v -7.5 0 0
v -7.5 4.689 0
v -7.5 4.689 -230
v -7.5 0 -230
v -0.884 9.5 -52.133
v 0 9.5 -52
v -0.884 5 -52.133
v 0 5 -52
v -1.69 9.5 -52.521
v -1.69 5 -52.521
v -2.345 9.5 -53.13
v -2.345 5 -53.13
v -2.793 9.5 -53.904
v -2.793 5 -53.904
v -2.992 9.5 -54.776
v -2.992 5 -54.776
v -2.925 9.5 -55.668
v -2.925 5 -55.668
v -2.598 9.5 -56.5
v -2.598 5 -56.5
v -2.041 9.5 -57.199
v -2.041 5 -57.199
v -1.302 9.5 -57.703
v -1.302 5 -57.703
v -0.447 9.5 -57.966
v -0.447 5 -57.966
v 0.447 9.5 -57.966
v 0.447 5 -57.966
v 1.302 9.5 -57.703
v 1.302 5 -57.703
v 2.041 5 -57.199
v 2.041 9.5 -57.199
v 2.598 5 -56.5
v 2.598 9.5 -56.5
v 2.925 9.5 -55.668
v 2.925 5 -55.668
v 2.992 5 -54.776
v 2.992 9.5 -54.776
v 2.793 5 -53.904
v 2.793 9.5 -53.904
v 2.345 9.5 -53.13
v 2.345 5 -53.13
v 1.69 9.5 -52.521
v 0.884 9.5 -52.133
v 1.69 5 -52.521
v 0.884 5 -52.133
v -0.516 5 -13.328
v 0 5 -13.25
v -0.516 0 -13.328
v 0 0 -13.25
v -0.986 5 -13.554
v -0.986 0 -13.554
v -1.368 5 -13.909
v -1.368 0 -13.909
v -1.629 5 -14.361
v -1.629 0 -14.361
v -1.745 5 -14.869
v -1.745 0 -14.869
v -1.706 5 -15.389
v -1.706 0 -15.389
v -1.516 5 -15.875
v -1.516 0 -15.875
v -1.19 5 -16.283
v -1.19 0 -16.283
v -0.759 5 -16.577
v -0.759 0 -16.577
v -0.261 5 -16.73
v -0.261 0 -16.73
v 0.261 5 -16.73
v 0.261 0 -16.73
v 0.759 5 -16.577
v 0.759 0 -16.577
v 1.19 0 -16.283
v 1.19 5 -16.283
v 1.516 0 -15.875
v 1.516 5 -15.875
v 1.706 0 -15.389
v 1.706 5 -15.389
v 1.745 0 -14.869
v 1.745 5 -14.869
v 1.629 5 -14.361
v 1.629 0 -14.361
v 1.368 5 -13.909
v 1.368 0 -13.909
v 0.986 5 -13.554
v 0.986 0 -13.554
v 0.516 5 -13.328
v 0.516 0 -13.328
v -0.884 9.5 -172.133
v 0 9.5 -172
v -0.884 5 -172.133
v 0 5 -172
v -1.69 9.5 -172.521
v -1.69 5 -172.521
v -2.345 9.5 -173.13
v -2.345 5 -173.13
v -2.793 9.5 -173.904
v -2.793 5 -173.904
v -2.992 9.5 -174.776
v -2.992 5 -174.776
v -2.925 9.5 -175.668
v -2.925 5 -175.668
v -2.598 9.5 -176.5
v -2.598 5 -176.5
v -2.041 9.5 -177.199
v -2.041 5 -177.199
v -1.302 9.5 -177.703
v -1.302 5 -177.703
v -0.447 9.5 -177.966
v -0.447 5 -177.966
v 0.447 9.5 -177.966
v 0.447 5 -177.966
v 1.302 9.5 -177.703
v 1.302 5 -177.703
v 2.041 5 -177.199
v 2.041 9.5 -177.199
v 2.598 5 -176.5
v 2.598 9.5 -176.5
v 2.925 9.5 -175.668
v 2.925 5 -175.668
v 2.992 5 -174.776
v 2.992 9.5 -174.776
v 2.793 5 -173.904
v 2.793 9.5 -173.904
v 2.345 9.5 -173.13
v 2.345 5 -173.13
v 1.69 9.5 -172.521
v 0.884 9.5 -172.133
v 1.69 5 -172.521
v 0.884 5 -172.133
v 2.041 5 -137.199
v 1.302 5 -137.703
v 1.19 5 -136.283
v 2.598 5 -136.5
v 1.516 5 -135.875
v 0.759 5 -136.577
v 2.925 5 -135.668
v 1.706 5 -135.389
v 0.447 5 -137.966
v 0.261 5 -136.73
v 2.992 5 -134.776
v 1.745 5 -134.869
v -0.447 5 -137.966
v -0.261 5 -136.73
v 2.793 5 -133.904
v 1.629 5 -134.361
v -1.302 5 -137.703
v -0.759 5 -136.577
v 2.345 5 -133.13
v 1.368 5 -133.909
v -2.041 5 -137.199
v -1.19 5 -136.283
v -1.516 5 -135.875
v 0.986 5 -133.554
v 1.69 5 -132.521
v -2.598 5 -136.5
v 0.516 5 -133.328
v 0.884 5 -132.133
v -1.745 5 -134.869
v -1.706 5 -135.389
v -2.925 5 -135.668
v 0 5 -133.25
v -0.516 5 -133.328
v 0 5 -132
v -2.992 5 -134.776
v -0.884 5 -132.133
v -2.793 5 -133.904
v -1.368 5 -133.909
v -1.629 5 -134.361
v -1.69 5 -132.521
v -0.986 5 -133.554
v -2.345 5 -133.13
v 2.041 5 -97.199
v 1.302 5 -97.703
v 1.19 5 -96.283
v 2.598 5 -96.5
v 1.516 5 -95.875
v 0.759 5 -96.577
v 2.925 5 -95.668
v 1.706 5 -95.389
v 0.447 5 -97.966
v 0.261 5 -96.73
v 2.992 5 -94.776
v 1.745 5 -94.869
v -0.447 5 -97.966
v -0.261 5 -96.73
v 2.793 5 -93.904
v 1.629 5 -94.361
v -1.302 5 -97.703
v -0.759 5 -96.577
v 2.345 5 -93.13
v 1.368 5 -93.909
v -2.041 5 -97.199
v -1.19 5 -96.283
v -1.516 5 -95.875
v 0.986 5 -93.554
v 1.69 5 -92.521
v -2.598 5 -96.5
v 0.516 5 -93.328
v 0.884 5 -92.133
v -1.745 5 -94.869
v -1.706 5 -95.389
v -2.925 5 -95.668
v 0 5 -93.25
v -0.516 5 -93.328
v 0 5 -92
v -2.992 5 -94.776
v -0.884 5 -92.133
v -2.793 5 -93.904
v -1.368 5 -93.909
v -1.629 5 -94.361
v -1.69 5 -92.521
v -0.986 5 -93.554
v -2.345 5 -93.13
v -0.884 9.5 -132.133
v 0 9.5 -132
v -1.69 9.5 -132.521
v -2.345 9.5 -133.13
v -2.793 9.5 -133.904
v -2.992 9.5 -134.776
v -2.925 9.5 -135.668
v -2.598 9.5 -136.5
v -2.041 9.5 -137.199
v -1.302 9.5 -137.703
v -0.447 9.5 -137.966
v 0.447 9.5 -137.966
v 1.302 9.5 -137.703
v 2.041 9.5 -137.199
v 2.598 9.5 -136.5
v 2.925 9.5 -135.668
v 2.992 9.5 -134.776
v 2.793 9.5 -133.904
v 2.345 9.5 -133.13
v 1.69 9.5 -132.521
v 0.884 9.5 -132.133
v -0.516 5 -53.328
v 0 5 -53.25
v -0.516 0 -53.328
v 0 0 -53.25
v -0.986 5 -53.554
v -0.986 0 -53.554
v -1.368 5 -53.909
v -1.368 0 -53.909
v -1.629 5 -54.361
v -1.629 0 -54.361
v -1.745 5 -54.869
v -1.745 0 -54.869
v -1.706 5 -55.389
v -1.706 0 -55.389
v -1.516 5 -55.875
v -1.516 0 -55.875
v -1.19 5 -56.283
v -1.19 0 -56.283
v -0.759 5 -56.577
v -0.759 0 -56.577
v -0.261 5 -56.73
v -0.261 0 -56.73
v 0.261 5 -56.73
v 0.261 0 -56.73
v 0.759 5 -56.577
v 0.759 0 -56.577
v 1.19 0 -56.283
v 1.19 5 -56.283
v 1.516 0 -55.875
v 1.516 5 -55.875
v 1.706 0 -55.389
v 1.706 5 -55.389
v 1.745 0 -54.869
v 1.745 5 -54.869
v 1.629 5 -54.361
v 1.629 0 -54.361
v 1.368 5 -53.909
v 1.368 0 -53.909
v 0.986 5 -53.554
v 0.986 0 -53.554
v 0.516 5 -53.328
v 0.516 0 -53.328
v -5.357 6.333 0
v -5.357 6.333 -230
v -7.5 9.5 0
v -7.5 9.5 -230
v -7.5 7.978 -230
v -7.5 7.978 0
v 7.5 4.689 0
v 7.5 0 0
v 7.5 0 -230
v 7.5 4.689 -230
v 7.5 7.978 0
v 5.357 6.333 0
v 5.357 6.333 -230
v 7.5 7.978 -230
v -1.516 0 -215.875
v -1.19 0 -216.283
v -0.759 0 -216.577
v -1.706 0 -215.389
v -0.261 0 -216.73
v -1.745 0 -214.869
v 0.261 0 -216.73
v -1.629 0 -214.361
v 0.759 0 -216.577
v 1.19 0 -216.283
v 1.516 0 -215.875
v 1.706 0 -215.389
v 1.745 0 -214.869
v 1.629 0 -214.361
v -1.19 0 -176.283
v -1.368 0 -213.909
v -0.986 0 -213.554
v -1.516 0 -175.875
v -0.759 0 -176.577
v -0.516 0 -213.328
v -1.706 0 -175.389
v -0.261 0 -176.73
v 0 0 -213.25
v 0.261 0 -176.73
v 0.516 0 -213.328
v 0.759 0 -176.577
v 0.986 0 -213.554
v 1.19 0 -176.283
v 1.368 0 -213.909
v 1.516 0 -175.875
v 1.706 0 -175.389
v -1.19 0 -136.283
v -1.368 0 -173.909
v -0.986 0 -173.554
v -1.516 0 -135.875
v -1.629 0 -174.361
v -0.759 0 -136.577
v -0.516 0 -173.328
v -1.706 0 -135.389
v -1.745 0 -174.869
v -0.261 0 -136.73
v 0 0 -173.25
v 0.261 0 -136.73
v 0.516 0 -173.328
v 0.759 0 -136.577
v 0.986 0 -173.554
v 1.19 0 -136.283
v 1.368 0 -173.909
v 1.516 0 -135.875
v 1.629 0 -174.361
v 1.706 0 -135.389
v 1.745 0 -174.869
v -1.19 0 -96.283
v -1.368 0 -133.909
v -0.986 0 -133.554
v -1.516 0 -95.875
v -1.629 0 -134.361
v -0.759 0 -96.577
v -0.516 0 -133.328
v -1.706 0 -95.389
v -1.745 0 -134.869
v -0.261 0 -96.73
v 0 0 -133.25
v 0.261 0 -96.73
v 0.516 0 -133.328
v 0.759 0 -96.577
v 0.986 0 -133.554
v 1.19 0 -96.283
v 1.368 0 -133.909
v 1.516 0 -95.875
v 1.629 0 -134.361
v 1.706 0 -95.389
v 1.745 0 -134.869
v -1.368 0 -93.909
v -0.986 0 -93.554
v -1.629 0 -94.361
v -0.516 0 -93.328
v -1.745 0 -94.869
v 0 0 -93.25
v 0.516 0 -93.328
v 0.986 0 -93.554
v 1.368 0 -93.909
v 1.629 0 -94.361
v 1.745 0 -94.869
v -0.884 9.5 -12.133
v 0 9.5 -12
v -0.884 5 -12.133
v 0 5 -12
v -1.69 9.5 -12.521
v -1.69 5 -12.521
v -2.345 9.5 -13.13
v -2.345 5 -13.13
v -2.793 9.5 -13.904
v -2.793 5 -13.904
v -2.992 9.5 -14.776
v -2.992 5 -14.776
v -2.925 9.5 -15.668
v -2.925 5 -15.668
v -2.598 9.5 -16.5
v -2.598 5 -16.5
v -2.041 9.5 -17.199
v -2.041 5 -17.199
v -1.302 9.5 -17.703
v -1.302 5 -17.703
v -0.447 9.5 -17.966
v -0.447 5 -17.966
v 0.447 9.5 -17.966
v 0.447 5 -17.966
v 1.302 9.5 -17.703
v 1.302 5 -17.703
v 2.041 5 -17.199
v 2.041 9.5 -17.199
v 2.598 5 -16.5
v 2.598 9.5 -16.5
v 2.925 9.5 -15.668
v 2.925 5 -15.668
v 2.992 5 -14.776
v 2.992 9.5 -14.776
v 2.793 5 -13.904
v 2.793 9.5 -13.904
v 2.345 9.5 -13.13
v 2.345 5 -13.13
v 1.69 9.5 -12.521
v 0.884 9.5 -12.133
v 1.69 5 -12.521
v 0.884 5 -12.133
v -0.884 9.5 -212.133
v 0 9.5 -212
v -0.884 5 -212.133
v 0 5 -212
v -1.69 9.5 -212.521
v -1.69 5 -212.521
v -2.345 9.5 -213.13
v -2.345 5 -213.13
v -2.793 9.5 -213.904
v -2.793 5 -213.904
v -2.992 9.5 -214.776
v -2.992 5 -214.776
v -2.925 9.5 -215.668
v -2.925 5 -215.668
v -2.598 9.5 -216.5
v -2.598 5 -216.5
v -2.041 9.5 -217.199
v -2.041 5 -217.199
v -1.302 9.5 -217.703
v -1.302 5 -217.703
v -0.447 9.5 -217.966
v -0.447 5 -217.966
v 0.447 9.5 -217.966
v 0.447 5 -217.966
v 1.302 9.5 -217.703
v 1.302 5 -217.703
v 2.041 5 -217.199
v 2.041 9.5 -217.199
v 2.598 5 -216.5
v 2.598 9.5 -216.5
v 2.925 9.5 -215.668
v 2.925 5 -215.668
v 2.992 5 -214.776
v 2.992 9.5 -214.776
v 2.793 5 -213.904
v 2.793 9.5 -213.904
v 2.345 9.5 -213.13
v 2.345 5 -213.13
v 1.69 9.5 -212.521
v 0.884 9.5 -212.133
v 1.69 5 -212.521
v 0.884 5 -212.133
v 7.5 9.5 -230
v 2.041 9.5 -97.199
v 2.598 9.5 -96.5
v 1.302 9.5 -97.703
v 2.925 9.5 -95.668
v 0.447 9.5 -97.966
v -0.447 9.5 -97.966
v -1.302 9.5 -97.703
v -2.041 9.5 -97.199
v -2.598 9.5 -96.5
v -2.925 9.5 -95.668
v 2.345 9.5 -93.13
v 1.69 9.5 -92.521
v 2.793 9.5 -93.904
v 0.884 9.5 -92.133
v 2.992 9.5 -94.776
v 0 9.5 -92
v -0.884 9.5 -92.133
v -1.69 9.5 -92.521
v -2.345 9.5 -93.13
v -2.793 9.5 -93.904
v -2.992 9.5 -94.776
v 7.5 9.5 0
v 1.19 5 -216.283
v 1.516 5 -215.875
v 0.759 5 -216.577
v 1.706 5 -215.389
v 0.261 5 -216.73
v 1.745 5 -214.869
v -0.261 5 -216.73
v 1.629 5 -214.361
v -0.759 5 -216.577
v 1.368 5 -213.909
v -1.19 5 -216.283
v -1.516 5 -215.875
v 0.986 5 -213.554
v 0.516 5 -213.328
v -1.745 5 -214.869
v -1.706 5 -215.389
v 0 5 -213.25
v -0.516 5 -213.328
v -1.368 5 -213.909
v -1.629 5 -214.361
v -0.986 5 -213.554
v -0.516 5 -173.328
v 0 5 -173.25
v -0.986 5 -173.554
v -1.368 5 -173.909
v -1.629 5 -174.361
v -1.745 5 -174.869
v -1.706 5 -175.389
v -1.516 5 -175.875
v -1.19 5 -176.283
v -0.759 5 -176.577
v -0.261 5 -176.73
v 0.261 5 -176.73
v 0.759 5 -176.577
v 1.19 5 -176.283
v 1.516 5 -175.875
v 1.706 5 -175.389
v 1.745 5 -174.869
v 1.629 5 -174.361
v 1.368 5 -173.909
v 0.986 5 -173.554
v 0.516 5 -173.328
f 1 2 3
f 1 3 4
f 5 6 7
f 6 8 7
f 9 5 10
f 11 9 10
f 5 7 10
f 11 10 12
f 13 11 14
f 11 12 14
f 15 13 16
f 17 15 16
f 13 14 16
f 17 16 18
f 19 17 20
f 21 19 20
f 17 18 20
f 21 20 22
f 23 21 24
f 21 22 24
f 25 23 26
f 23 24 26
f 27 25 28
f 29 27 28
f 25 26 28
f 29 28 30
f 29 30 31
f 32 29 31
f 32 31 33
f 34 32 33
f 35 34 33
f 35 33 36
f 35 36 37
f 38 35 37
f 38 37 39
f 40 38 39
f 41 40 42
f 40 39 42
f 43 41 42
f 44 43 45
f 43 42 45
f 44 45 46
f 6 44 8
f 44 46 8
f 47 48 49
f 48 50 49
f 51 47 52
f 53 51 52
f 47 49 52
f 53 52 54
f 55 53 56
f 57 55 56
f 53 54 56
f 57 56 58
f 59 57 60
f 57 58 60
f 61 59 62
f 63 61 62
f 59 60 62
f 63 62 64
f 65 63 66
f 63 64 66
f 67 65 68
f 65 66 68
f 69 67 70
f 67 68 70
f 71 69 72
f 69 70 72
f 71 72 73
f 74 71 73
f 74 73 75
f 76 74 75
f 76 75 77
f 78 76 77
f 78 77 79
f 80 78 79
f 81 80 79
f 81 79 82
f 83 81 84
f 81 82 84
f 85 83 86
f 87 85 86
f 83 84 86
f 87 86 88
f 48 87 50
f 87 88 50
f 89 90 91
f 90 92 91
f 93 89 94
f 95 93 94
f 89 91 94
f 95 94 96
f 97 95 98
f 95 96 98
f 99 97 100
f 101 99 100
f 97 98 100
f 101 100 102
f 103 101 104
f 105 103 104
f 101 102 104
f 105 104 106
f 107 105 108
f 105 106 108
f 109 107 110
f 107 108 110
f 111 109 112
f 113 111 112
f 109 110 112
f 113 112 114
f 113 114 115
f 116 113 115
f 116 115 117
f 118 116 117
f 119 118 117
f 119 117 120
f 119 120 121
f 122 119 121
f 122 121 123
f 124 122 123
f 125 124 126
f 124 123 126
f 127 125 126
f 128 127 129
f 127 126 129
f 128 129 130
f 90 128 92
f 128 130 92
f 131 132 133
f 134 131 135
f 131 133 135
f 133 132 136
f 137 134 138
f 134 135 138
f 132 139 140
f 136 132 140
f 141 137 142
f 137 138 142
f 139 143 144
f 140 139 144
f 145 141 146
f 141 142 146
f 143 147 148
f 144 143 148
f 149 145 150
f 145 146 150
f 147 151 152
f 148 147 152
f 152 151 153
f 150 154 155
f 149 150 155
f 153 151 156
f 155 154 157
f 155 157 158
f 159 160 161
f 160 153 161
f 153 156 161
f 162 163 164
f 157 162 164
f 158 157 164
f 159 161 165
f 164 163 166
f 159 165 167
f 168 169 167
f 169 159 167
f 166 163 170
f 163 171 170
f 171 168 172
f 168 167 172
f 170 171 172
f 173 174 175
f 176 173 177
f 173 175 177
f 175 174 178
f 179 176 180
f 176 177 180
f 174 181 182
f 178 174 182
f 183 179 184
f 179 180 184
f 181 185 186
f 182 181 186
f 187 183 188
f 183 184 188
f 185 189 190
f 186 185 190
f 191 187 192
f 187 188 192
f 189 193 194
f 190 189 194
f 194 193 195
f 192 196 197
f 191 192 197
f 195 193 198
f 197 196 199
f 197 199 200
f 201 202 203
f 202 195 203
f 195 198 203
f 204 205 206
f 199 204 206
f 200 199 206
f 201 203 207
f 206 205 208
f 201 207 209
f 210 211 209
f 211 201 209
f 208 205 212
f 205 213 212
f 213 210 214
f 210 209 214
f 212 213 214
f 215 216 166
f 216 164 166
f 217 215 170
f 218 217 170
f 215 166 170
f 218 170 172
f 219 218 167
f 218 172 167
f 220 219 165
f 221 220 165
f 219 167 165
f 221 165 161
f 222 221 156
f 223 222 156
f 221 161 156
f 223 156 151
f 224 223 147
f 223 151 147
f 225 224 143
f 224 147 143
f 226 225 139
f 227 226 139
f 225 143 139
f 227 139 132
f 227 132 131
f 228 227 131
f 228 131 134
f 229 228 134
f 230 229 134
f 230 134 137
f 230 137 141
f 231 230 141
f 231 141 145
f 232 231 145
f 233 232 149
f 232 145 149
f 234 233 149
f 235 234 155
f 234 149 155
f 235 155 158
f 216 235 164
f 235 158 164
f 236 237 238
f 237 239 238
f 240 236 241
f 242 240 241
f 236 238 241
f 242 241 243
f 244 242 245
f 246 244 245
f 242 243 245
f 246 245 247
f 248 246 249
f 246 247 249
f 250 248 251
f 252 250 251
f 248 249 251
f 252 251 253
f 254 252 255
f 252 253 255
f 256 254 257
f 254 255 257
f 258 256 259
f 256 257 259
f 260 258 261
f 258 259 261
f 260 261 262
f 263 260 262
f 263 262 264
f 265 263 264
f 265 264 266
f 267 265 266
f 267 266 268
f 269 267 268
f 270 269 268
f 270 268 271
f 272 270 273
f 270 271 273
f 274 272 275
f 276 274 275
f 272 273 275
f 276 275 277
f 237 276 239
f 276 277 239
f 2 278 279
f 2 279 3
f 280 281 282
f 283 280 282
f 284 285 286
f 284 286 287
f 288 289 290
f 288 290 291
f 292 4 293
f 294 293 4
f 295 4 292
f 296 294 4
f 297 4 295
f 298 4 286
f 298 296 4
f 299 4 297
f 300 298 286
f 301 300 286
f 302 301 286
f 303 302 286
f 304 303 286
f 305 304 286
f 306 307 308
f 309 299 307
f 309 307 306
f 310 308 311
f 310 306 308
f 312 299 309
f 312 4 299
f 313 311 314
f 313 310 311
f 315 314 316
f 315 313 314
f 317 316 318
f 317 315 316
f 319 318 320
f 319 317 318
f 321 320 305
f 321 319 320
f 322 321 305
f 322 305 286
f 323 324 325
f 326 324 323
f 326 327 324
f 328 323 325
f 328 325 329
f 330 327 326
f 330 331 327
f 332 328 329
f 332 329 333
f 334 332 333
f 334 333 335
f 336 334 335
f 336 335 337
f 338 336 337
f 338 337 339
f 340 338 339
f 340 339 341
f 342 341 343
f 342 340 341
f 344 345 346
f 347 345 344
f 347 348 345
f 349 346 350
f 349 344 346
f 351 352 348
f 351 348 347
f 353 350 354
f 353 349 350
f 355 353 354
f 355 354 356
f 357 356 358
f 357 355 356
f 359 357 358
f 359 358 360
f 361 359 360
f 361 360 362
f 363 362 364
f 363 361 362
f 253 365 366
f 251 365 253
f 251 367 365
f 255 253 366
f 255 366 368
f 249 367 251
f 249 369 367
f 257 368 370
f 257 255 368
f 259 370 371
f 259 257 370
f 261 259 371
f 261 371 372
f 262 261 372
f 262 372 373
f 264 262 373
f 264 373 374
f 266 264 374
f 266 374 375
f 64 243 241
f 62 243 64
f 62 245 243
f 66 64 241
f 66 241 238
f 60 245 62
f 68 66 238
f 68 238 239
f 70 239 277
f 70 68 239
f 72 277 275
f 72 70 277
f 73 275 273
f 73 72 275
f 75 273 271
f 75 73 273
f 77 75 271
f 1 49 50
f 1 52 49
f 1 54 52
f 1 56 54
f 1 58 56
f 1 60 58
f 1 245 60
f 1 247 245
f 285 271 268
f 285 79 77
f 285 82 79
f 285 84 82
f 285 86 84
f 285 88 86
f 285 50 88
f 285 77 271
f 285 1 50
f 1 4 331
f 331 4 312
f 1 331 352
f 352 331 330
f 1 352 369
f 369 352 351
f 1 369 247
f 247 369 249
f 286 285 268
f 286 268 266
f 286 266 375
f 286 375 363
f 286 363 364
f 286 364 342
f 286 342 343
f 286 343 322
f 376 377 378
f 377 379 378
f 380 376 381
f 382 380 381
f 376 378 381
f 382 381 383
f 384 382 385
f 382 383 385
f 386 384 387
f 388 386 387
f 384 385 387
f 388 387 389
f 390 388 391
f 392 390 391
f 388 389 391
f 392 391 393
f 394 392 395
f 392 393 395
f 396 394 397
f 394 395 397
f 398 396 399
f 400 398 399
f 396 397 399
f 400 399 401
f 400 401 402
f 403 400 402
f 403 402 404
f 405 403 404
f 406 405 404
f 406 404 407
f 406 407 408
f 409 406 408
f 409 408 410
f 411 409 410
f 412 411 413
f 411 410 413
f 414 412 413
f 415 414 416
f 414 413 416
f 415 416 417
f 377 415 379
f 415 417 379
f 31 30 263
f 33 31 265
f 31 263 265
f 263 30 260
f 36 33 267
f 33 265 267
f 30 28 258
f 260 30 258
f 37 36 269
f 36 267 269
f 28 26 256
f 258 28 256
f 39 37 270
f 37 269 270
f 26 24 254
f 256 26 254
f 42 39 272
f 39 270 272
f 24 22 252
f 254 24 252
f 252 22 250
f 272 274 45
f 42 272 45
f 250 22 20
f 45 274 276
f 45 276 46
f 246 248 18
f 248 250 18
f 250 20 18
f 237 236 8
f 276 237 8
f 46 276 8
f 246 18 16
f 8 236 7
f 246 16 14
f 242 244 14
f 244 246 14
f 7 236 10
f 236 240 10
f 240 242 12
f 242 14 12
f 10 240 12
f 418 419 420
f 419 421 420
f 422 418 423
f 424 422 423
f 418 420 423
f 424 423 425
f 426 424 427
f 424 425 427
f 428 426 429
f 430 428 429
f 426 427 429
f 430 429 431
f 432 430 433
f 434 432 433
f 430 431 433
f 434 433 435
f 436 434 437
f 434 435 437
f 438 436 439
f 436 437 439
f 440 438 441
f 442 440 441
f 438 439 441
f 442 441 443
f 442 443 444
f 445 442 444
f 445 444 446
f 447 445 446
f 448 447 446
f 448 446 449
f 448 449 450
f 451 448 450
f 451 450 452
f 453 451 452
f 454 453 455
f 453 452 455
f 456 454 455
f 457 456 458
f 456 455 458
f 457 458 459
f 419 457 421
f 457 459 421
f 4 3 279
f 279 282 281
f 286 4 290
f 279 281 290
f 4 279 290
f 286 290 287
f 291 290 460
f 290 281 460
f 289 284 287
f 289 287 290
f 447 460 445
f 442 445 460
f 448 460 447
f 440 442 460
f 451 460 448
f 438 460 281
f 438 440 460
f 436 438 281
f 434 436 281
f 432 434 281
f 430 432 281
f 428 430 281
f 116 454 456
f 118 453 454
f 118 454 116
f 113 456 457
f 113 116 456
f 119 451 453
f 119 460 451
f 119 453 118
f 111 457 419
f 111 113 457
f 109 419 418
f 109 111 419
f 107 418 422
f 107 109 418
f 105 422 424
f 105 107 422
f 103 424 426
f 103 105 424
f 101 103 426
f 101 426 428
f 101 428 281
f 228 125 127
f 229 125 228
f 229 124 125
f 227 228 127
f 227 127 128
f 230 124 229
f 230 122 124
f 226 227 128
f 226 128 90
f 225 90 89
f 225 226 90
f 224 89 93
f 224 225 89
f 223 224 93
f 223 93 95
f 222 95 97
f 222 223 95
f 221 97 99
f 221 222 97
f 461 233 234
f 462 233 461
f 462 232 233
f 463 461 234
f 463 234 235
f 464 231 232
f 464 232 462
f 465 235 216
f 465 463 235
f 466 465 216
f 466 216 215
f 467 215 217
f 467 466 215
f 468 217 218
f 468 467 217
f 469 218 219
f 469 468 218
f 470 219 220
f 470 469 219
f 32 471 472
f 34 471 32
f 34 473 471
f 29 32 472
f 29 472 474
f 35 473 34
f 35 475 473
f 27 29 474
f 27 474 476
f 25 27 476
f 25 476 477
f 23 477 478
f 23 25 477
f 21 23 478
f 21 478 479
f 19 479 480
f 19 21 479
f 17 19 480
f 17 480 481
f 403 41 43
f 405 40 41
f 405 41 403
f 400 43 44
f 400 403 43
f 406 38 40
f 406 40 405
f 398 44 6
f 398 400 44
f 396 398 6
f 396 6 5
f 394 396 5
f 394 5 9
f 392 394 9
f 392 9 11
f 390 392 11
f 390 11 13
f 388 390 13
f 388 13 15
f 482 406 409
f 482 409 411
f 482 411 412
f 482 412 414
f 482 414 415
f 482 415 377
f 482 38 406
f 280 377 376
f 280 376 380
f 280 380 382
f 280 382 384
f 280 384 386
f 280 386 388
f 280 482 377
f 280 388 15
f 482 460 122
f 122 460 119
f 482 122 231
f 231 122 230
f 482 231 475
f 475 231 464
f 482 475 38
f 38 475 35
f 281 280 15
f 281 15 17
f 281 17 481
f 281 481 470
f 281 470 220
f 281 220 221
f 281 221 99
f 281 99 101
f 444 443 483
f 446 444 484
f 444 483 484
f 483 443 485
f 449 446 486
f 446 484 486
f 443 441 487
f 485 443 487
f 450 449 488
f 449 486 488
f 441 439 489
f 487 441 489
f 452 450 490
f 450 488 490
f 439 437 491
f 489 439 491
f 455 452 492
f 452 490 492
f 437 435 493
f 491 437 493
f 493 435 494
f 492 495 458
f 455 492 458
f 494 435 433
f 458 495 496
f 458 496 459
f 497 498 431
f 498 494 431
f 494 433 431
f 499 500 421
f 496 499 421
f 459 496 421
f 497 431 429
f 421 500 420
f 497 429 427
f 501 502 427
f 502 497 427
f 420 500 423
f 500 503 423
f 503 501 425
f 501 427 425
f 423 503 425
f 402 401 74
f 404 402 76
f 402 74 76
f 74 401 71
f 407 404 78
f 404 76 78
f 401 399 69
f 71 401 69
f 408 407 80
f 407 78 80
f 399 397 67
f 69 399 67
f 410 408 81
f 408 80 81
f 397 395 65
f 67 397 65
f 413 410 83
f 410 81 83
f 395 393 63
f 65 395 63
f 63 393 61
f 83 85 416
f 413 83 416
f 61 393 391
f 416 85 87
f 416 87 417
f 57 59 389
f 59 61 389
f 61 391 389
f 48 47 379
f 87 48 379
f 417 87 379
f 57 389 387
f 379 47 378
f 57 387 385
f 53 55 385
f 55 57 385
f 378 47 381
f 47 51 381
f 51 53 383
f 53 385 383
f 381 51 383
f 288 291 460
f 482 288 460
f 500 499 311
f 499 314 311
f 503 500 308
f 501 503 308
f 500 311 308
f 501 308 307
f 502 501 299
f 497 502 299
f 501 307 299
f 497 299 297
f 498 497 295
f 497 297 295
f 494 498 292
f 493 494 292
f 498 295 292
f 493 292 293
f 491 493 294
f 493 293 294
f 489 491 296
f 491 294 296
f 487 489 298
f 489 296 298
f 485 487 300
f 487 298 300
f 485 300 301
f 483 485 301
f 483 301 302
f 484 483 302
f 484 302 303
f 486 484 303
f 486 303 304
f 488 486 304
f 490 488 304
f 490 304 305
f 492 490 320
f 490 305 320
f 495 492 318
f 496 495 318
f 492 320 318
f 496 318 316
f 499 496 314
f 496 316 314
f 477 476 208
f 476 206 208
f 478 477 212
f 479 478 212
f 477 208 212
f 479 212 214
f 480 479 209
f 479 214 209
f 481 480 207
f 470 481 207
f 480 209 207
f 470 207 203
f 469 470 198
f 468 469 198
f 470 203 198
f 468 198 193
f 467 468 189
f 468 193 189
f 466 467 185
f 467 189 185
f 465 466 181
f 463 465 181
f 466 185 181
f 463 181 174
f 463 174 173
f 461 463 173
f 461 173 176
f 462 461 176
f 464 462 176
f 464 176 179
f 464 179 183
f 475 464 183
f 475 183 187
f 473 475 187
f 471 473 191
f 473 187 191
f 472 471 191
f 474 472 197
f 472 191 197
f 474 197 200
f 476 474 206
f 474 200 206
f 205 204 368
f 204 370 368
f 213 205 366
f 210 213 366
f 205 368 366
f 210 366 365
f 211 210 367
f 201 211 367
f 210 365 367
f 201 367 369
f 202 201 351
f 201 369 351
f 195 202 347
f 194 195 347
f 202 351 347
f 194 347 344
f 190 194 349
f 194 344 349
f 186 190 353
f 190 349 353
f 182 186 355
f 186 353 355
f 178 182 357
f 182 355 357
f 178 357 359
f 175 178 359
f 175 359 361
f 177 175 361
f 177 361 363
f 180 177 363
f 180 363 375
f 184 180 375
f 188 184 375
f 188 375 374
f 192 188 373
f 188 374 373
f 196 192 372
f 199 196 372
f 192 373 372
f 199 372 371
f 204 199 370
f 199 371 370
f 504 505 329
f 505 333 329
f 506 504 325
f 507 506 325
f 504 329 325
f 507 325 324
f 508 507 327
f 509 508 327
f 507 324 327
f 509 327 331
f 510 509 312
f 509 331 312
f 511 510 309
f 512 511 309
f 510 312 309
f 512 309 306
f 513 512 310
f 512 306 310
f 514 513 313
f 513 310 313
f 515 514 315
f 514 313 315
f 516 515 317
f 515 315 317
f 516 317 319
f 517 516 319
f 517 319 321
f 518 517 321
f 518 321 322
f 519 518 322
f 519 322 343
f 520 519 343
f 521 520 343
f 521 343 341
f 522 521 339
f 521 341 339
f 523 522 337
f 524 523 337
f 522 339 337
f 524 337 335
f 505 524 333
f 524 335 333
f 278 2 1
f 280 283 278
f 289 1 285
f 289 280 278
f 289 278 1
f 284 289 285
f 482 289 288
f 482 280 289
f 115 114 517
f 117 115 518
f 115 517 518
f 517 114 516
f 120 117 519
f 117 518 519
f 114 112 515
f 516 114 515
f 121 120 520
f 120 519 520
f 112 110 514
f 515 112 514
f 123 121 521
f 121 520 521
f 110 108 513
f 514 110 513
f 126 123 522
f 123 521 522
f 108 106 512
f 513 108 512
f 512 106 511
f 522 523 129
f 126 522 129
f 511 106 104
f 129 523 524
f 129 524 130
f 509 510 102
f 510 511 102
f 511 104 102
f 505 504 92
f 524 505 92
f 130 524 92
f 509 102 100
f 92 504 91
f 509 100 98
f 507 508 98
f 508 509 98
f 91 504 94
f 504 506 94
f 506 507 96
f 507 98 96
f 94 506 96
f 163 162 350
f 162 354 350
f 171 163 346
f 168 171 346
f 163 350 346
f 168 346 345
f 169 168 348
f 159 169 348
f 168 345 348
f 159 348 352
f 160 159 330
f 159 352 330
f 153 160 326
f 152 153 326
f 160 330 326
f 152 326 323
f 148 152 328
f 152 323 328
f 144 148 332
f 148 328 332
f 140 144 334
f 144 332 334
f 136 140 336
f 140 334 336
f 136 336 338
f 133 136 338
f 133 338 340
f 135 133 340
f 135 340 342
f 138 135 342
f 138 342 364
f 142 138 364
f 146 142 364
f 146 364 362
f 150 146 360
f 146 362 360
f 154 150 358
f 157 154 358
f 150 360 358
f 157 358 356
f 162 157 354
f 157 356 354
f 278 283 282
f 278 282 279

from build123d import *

# Parameters (mm, degrees)
RAIL_DEPTH      = 230
LPATTERN1_COUNT = 6
LPATTERN1_PITCH = 40


with BuildPart() as part:
    # Sketch2 → Rail (new body)
    with BuildSketch(Plane.XY):
        Polygon((-7.5, 0), (7.5, 0), (7.5, 4.689061216), (5.357142857, 6.333333333), (7.5, 7.97760545), (7.5, 9.5), (-7.5, 9.5), (-7.5, 7.97760545), (-5.357142857, 6.333333333), (-7.5, 4.689061216), align=None)
    extrude(amount=-RAIL_DEPTH)

    # Sketch6 → C'Bore (revolve, cut)
    with BuildSketch(Plane(origin=(0, 0, 0), x_dir=(0, 0, -1), z_dir=(1, 0, 0)), mode=Mode.PRIVATE) as c_bore_sk:
        Polygon((215, 9.5), (218, 9.5), (218, 5), (216.75, 5), (216.75, 0), (215, 0), align=None)
    c_bore = revolve(c_bore_sk.sketch.rotate(Axis((0, 8.904905435, -215), (0, -1, 0)), 180), axis=Axis((0, 8.904905435, -215), (0, -1, 0)), mode=Mode.SUBTRACT)

    # LPattern1: C'Bore ×6
    with Locations(*[(0, 0, i * LPATTERN1_PITCH) for i in range(1, LPATTERN1_COUNT)]):
        add(c_bore, mode=Mode.SUBTRACT)


solid = part.part
